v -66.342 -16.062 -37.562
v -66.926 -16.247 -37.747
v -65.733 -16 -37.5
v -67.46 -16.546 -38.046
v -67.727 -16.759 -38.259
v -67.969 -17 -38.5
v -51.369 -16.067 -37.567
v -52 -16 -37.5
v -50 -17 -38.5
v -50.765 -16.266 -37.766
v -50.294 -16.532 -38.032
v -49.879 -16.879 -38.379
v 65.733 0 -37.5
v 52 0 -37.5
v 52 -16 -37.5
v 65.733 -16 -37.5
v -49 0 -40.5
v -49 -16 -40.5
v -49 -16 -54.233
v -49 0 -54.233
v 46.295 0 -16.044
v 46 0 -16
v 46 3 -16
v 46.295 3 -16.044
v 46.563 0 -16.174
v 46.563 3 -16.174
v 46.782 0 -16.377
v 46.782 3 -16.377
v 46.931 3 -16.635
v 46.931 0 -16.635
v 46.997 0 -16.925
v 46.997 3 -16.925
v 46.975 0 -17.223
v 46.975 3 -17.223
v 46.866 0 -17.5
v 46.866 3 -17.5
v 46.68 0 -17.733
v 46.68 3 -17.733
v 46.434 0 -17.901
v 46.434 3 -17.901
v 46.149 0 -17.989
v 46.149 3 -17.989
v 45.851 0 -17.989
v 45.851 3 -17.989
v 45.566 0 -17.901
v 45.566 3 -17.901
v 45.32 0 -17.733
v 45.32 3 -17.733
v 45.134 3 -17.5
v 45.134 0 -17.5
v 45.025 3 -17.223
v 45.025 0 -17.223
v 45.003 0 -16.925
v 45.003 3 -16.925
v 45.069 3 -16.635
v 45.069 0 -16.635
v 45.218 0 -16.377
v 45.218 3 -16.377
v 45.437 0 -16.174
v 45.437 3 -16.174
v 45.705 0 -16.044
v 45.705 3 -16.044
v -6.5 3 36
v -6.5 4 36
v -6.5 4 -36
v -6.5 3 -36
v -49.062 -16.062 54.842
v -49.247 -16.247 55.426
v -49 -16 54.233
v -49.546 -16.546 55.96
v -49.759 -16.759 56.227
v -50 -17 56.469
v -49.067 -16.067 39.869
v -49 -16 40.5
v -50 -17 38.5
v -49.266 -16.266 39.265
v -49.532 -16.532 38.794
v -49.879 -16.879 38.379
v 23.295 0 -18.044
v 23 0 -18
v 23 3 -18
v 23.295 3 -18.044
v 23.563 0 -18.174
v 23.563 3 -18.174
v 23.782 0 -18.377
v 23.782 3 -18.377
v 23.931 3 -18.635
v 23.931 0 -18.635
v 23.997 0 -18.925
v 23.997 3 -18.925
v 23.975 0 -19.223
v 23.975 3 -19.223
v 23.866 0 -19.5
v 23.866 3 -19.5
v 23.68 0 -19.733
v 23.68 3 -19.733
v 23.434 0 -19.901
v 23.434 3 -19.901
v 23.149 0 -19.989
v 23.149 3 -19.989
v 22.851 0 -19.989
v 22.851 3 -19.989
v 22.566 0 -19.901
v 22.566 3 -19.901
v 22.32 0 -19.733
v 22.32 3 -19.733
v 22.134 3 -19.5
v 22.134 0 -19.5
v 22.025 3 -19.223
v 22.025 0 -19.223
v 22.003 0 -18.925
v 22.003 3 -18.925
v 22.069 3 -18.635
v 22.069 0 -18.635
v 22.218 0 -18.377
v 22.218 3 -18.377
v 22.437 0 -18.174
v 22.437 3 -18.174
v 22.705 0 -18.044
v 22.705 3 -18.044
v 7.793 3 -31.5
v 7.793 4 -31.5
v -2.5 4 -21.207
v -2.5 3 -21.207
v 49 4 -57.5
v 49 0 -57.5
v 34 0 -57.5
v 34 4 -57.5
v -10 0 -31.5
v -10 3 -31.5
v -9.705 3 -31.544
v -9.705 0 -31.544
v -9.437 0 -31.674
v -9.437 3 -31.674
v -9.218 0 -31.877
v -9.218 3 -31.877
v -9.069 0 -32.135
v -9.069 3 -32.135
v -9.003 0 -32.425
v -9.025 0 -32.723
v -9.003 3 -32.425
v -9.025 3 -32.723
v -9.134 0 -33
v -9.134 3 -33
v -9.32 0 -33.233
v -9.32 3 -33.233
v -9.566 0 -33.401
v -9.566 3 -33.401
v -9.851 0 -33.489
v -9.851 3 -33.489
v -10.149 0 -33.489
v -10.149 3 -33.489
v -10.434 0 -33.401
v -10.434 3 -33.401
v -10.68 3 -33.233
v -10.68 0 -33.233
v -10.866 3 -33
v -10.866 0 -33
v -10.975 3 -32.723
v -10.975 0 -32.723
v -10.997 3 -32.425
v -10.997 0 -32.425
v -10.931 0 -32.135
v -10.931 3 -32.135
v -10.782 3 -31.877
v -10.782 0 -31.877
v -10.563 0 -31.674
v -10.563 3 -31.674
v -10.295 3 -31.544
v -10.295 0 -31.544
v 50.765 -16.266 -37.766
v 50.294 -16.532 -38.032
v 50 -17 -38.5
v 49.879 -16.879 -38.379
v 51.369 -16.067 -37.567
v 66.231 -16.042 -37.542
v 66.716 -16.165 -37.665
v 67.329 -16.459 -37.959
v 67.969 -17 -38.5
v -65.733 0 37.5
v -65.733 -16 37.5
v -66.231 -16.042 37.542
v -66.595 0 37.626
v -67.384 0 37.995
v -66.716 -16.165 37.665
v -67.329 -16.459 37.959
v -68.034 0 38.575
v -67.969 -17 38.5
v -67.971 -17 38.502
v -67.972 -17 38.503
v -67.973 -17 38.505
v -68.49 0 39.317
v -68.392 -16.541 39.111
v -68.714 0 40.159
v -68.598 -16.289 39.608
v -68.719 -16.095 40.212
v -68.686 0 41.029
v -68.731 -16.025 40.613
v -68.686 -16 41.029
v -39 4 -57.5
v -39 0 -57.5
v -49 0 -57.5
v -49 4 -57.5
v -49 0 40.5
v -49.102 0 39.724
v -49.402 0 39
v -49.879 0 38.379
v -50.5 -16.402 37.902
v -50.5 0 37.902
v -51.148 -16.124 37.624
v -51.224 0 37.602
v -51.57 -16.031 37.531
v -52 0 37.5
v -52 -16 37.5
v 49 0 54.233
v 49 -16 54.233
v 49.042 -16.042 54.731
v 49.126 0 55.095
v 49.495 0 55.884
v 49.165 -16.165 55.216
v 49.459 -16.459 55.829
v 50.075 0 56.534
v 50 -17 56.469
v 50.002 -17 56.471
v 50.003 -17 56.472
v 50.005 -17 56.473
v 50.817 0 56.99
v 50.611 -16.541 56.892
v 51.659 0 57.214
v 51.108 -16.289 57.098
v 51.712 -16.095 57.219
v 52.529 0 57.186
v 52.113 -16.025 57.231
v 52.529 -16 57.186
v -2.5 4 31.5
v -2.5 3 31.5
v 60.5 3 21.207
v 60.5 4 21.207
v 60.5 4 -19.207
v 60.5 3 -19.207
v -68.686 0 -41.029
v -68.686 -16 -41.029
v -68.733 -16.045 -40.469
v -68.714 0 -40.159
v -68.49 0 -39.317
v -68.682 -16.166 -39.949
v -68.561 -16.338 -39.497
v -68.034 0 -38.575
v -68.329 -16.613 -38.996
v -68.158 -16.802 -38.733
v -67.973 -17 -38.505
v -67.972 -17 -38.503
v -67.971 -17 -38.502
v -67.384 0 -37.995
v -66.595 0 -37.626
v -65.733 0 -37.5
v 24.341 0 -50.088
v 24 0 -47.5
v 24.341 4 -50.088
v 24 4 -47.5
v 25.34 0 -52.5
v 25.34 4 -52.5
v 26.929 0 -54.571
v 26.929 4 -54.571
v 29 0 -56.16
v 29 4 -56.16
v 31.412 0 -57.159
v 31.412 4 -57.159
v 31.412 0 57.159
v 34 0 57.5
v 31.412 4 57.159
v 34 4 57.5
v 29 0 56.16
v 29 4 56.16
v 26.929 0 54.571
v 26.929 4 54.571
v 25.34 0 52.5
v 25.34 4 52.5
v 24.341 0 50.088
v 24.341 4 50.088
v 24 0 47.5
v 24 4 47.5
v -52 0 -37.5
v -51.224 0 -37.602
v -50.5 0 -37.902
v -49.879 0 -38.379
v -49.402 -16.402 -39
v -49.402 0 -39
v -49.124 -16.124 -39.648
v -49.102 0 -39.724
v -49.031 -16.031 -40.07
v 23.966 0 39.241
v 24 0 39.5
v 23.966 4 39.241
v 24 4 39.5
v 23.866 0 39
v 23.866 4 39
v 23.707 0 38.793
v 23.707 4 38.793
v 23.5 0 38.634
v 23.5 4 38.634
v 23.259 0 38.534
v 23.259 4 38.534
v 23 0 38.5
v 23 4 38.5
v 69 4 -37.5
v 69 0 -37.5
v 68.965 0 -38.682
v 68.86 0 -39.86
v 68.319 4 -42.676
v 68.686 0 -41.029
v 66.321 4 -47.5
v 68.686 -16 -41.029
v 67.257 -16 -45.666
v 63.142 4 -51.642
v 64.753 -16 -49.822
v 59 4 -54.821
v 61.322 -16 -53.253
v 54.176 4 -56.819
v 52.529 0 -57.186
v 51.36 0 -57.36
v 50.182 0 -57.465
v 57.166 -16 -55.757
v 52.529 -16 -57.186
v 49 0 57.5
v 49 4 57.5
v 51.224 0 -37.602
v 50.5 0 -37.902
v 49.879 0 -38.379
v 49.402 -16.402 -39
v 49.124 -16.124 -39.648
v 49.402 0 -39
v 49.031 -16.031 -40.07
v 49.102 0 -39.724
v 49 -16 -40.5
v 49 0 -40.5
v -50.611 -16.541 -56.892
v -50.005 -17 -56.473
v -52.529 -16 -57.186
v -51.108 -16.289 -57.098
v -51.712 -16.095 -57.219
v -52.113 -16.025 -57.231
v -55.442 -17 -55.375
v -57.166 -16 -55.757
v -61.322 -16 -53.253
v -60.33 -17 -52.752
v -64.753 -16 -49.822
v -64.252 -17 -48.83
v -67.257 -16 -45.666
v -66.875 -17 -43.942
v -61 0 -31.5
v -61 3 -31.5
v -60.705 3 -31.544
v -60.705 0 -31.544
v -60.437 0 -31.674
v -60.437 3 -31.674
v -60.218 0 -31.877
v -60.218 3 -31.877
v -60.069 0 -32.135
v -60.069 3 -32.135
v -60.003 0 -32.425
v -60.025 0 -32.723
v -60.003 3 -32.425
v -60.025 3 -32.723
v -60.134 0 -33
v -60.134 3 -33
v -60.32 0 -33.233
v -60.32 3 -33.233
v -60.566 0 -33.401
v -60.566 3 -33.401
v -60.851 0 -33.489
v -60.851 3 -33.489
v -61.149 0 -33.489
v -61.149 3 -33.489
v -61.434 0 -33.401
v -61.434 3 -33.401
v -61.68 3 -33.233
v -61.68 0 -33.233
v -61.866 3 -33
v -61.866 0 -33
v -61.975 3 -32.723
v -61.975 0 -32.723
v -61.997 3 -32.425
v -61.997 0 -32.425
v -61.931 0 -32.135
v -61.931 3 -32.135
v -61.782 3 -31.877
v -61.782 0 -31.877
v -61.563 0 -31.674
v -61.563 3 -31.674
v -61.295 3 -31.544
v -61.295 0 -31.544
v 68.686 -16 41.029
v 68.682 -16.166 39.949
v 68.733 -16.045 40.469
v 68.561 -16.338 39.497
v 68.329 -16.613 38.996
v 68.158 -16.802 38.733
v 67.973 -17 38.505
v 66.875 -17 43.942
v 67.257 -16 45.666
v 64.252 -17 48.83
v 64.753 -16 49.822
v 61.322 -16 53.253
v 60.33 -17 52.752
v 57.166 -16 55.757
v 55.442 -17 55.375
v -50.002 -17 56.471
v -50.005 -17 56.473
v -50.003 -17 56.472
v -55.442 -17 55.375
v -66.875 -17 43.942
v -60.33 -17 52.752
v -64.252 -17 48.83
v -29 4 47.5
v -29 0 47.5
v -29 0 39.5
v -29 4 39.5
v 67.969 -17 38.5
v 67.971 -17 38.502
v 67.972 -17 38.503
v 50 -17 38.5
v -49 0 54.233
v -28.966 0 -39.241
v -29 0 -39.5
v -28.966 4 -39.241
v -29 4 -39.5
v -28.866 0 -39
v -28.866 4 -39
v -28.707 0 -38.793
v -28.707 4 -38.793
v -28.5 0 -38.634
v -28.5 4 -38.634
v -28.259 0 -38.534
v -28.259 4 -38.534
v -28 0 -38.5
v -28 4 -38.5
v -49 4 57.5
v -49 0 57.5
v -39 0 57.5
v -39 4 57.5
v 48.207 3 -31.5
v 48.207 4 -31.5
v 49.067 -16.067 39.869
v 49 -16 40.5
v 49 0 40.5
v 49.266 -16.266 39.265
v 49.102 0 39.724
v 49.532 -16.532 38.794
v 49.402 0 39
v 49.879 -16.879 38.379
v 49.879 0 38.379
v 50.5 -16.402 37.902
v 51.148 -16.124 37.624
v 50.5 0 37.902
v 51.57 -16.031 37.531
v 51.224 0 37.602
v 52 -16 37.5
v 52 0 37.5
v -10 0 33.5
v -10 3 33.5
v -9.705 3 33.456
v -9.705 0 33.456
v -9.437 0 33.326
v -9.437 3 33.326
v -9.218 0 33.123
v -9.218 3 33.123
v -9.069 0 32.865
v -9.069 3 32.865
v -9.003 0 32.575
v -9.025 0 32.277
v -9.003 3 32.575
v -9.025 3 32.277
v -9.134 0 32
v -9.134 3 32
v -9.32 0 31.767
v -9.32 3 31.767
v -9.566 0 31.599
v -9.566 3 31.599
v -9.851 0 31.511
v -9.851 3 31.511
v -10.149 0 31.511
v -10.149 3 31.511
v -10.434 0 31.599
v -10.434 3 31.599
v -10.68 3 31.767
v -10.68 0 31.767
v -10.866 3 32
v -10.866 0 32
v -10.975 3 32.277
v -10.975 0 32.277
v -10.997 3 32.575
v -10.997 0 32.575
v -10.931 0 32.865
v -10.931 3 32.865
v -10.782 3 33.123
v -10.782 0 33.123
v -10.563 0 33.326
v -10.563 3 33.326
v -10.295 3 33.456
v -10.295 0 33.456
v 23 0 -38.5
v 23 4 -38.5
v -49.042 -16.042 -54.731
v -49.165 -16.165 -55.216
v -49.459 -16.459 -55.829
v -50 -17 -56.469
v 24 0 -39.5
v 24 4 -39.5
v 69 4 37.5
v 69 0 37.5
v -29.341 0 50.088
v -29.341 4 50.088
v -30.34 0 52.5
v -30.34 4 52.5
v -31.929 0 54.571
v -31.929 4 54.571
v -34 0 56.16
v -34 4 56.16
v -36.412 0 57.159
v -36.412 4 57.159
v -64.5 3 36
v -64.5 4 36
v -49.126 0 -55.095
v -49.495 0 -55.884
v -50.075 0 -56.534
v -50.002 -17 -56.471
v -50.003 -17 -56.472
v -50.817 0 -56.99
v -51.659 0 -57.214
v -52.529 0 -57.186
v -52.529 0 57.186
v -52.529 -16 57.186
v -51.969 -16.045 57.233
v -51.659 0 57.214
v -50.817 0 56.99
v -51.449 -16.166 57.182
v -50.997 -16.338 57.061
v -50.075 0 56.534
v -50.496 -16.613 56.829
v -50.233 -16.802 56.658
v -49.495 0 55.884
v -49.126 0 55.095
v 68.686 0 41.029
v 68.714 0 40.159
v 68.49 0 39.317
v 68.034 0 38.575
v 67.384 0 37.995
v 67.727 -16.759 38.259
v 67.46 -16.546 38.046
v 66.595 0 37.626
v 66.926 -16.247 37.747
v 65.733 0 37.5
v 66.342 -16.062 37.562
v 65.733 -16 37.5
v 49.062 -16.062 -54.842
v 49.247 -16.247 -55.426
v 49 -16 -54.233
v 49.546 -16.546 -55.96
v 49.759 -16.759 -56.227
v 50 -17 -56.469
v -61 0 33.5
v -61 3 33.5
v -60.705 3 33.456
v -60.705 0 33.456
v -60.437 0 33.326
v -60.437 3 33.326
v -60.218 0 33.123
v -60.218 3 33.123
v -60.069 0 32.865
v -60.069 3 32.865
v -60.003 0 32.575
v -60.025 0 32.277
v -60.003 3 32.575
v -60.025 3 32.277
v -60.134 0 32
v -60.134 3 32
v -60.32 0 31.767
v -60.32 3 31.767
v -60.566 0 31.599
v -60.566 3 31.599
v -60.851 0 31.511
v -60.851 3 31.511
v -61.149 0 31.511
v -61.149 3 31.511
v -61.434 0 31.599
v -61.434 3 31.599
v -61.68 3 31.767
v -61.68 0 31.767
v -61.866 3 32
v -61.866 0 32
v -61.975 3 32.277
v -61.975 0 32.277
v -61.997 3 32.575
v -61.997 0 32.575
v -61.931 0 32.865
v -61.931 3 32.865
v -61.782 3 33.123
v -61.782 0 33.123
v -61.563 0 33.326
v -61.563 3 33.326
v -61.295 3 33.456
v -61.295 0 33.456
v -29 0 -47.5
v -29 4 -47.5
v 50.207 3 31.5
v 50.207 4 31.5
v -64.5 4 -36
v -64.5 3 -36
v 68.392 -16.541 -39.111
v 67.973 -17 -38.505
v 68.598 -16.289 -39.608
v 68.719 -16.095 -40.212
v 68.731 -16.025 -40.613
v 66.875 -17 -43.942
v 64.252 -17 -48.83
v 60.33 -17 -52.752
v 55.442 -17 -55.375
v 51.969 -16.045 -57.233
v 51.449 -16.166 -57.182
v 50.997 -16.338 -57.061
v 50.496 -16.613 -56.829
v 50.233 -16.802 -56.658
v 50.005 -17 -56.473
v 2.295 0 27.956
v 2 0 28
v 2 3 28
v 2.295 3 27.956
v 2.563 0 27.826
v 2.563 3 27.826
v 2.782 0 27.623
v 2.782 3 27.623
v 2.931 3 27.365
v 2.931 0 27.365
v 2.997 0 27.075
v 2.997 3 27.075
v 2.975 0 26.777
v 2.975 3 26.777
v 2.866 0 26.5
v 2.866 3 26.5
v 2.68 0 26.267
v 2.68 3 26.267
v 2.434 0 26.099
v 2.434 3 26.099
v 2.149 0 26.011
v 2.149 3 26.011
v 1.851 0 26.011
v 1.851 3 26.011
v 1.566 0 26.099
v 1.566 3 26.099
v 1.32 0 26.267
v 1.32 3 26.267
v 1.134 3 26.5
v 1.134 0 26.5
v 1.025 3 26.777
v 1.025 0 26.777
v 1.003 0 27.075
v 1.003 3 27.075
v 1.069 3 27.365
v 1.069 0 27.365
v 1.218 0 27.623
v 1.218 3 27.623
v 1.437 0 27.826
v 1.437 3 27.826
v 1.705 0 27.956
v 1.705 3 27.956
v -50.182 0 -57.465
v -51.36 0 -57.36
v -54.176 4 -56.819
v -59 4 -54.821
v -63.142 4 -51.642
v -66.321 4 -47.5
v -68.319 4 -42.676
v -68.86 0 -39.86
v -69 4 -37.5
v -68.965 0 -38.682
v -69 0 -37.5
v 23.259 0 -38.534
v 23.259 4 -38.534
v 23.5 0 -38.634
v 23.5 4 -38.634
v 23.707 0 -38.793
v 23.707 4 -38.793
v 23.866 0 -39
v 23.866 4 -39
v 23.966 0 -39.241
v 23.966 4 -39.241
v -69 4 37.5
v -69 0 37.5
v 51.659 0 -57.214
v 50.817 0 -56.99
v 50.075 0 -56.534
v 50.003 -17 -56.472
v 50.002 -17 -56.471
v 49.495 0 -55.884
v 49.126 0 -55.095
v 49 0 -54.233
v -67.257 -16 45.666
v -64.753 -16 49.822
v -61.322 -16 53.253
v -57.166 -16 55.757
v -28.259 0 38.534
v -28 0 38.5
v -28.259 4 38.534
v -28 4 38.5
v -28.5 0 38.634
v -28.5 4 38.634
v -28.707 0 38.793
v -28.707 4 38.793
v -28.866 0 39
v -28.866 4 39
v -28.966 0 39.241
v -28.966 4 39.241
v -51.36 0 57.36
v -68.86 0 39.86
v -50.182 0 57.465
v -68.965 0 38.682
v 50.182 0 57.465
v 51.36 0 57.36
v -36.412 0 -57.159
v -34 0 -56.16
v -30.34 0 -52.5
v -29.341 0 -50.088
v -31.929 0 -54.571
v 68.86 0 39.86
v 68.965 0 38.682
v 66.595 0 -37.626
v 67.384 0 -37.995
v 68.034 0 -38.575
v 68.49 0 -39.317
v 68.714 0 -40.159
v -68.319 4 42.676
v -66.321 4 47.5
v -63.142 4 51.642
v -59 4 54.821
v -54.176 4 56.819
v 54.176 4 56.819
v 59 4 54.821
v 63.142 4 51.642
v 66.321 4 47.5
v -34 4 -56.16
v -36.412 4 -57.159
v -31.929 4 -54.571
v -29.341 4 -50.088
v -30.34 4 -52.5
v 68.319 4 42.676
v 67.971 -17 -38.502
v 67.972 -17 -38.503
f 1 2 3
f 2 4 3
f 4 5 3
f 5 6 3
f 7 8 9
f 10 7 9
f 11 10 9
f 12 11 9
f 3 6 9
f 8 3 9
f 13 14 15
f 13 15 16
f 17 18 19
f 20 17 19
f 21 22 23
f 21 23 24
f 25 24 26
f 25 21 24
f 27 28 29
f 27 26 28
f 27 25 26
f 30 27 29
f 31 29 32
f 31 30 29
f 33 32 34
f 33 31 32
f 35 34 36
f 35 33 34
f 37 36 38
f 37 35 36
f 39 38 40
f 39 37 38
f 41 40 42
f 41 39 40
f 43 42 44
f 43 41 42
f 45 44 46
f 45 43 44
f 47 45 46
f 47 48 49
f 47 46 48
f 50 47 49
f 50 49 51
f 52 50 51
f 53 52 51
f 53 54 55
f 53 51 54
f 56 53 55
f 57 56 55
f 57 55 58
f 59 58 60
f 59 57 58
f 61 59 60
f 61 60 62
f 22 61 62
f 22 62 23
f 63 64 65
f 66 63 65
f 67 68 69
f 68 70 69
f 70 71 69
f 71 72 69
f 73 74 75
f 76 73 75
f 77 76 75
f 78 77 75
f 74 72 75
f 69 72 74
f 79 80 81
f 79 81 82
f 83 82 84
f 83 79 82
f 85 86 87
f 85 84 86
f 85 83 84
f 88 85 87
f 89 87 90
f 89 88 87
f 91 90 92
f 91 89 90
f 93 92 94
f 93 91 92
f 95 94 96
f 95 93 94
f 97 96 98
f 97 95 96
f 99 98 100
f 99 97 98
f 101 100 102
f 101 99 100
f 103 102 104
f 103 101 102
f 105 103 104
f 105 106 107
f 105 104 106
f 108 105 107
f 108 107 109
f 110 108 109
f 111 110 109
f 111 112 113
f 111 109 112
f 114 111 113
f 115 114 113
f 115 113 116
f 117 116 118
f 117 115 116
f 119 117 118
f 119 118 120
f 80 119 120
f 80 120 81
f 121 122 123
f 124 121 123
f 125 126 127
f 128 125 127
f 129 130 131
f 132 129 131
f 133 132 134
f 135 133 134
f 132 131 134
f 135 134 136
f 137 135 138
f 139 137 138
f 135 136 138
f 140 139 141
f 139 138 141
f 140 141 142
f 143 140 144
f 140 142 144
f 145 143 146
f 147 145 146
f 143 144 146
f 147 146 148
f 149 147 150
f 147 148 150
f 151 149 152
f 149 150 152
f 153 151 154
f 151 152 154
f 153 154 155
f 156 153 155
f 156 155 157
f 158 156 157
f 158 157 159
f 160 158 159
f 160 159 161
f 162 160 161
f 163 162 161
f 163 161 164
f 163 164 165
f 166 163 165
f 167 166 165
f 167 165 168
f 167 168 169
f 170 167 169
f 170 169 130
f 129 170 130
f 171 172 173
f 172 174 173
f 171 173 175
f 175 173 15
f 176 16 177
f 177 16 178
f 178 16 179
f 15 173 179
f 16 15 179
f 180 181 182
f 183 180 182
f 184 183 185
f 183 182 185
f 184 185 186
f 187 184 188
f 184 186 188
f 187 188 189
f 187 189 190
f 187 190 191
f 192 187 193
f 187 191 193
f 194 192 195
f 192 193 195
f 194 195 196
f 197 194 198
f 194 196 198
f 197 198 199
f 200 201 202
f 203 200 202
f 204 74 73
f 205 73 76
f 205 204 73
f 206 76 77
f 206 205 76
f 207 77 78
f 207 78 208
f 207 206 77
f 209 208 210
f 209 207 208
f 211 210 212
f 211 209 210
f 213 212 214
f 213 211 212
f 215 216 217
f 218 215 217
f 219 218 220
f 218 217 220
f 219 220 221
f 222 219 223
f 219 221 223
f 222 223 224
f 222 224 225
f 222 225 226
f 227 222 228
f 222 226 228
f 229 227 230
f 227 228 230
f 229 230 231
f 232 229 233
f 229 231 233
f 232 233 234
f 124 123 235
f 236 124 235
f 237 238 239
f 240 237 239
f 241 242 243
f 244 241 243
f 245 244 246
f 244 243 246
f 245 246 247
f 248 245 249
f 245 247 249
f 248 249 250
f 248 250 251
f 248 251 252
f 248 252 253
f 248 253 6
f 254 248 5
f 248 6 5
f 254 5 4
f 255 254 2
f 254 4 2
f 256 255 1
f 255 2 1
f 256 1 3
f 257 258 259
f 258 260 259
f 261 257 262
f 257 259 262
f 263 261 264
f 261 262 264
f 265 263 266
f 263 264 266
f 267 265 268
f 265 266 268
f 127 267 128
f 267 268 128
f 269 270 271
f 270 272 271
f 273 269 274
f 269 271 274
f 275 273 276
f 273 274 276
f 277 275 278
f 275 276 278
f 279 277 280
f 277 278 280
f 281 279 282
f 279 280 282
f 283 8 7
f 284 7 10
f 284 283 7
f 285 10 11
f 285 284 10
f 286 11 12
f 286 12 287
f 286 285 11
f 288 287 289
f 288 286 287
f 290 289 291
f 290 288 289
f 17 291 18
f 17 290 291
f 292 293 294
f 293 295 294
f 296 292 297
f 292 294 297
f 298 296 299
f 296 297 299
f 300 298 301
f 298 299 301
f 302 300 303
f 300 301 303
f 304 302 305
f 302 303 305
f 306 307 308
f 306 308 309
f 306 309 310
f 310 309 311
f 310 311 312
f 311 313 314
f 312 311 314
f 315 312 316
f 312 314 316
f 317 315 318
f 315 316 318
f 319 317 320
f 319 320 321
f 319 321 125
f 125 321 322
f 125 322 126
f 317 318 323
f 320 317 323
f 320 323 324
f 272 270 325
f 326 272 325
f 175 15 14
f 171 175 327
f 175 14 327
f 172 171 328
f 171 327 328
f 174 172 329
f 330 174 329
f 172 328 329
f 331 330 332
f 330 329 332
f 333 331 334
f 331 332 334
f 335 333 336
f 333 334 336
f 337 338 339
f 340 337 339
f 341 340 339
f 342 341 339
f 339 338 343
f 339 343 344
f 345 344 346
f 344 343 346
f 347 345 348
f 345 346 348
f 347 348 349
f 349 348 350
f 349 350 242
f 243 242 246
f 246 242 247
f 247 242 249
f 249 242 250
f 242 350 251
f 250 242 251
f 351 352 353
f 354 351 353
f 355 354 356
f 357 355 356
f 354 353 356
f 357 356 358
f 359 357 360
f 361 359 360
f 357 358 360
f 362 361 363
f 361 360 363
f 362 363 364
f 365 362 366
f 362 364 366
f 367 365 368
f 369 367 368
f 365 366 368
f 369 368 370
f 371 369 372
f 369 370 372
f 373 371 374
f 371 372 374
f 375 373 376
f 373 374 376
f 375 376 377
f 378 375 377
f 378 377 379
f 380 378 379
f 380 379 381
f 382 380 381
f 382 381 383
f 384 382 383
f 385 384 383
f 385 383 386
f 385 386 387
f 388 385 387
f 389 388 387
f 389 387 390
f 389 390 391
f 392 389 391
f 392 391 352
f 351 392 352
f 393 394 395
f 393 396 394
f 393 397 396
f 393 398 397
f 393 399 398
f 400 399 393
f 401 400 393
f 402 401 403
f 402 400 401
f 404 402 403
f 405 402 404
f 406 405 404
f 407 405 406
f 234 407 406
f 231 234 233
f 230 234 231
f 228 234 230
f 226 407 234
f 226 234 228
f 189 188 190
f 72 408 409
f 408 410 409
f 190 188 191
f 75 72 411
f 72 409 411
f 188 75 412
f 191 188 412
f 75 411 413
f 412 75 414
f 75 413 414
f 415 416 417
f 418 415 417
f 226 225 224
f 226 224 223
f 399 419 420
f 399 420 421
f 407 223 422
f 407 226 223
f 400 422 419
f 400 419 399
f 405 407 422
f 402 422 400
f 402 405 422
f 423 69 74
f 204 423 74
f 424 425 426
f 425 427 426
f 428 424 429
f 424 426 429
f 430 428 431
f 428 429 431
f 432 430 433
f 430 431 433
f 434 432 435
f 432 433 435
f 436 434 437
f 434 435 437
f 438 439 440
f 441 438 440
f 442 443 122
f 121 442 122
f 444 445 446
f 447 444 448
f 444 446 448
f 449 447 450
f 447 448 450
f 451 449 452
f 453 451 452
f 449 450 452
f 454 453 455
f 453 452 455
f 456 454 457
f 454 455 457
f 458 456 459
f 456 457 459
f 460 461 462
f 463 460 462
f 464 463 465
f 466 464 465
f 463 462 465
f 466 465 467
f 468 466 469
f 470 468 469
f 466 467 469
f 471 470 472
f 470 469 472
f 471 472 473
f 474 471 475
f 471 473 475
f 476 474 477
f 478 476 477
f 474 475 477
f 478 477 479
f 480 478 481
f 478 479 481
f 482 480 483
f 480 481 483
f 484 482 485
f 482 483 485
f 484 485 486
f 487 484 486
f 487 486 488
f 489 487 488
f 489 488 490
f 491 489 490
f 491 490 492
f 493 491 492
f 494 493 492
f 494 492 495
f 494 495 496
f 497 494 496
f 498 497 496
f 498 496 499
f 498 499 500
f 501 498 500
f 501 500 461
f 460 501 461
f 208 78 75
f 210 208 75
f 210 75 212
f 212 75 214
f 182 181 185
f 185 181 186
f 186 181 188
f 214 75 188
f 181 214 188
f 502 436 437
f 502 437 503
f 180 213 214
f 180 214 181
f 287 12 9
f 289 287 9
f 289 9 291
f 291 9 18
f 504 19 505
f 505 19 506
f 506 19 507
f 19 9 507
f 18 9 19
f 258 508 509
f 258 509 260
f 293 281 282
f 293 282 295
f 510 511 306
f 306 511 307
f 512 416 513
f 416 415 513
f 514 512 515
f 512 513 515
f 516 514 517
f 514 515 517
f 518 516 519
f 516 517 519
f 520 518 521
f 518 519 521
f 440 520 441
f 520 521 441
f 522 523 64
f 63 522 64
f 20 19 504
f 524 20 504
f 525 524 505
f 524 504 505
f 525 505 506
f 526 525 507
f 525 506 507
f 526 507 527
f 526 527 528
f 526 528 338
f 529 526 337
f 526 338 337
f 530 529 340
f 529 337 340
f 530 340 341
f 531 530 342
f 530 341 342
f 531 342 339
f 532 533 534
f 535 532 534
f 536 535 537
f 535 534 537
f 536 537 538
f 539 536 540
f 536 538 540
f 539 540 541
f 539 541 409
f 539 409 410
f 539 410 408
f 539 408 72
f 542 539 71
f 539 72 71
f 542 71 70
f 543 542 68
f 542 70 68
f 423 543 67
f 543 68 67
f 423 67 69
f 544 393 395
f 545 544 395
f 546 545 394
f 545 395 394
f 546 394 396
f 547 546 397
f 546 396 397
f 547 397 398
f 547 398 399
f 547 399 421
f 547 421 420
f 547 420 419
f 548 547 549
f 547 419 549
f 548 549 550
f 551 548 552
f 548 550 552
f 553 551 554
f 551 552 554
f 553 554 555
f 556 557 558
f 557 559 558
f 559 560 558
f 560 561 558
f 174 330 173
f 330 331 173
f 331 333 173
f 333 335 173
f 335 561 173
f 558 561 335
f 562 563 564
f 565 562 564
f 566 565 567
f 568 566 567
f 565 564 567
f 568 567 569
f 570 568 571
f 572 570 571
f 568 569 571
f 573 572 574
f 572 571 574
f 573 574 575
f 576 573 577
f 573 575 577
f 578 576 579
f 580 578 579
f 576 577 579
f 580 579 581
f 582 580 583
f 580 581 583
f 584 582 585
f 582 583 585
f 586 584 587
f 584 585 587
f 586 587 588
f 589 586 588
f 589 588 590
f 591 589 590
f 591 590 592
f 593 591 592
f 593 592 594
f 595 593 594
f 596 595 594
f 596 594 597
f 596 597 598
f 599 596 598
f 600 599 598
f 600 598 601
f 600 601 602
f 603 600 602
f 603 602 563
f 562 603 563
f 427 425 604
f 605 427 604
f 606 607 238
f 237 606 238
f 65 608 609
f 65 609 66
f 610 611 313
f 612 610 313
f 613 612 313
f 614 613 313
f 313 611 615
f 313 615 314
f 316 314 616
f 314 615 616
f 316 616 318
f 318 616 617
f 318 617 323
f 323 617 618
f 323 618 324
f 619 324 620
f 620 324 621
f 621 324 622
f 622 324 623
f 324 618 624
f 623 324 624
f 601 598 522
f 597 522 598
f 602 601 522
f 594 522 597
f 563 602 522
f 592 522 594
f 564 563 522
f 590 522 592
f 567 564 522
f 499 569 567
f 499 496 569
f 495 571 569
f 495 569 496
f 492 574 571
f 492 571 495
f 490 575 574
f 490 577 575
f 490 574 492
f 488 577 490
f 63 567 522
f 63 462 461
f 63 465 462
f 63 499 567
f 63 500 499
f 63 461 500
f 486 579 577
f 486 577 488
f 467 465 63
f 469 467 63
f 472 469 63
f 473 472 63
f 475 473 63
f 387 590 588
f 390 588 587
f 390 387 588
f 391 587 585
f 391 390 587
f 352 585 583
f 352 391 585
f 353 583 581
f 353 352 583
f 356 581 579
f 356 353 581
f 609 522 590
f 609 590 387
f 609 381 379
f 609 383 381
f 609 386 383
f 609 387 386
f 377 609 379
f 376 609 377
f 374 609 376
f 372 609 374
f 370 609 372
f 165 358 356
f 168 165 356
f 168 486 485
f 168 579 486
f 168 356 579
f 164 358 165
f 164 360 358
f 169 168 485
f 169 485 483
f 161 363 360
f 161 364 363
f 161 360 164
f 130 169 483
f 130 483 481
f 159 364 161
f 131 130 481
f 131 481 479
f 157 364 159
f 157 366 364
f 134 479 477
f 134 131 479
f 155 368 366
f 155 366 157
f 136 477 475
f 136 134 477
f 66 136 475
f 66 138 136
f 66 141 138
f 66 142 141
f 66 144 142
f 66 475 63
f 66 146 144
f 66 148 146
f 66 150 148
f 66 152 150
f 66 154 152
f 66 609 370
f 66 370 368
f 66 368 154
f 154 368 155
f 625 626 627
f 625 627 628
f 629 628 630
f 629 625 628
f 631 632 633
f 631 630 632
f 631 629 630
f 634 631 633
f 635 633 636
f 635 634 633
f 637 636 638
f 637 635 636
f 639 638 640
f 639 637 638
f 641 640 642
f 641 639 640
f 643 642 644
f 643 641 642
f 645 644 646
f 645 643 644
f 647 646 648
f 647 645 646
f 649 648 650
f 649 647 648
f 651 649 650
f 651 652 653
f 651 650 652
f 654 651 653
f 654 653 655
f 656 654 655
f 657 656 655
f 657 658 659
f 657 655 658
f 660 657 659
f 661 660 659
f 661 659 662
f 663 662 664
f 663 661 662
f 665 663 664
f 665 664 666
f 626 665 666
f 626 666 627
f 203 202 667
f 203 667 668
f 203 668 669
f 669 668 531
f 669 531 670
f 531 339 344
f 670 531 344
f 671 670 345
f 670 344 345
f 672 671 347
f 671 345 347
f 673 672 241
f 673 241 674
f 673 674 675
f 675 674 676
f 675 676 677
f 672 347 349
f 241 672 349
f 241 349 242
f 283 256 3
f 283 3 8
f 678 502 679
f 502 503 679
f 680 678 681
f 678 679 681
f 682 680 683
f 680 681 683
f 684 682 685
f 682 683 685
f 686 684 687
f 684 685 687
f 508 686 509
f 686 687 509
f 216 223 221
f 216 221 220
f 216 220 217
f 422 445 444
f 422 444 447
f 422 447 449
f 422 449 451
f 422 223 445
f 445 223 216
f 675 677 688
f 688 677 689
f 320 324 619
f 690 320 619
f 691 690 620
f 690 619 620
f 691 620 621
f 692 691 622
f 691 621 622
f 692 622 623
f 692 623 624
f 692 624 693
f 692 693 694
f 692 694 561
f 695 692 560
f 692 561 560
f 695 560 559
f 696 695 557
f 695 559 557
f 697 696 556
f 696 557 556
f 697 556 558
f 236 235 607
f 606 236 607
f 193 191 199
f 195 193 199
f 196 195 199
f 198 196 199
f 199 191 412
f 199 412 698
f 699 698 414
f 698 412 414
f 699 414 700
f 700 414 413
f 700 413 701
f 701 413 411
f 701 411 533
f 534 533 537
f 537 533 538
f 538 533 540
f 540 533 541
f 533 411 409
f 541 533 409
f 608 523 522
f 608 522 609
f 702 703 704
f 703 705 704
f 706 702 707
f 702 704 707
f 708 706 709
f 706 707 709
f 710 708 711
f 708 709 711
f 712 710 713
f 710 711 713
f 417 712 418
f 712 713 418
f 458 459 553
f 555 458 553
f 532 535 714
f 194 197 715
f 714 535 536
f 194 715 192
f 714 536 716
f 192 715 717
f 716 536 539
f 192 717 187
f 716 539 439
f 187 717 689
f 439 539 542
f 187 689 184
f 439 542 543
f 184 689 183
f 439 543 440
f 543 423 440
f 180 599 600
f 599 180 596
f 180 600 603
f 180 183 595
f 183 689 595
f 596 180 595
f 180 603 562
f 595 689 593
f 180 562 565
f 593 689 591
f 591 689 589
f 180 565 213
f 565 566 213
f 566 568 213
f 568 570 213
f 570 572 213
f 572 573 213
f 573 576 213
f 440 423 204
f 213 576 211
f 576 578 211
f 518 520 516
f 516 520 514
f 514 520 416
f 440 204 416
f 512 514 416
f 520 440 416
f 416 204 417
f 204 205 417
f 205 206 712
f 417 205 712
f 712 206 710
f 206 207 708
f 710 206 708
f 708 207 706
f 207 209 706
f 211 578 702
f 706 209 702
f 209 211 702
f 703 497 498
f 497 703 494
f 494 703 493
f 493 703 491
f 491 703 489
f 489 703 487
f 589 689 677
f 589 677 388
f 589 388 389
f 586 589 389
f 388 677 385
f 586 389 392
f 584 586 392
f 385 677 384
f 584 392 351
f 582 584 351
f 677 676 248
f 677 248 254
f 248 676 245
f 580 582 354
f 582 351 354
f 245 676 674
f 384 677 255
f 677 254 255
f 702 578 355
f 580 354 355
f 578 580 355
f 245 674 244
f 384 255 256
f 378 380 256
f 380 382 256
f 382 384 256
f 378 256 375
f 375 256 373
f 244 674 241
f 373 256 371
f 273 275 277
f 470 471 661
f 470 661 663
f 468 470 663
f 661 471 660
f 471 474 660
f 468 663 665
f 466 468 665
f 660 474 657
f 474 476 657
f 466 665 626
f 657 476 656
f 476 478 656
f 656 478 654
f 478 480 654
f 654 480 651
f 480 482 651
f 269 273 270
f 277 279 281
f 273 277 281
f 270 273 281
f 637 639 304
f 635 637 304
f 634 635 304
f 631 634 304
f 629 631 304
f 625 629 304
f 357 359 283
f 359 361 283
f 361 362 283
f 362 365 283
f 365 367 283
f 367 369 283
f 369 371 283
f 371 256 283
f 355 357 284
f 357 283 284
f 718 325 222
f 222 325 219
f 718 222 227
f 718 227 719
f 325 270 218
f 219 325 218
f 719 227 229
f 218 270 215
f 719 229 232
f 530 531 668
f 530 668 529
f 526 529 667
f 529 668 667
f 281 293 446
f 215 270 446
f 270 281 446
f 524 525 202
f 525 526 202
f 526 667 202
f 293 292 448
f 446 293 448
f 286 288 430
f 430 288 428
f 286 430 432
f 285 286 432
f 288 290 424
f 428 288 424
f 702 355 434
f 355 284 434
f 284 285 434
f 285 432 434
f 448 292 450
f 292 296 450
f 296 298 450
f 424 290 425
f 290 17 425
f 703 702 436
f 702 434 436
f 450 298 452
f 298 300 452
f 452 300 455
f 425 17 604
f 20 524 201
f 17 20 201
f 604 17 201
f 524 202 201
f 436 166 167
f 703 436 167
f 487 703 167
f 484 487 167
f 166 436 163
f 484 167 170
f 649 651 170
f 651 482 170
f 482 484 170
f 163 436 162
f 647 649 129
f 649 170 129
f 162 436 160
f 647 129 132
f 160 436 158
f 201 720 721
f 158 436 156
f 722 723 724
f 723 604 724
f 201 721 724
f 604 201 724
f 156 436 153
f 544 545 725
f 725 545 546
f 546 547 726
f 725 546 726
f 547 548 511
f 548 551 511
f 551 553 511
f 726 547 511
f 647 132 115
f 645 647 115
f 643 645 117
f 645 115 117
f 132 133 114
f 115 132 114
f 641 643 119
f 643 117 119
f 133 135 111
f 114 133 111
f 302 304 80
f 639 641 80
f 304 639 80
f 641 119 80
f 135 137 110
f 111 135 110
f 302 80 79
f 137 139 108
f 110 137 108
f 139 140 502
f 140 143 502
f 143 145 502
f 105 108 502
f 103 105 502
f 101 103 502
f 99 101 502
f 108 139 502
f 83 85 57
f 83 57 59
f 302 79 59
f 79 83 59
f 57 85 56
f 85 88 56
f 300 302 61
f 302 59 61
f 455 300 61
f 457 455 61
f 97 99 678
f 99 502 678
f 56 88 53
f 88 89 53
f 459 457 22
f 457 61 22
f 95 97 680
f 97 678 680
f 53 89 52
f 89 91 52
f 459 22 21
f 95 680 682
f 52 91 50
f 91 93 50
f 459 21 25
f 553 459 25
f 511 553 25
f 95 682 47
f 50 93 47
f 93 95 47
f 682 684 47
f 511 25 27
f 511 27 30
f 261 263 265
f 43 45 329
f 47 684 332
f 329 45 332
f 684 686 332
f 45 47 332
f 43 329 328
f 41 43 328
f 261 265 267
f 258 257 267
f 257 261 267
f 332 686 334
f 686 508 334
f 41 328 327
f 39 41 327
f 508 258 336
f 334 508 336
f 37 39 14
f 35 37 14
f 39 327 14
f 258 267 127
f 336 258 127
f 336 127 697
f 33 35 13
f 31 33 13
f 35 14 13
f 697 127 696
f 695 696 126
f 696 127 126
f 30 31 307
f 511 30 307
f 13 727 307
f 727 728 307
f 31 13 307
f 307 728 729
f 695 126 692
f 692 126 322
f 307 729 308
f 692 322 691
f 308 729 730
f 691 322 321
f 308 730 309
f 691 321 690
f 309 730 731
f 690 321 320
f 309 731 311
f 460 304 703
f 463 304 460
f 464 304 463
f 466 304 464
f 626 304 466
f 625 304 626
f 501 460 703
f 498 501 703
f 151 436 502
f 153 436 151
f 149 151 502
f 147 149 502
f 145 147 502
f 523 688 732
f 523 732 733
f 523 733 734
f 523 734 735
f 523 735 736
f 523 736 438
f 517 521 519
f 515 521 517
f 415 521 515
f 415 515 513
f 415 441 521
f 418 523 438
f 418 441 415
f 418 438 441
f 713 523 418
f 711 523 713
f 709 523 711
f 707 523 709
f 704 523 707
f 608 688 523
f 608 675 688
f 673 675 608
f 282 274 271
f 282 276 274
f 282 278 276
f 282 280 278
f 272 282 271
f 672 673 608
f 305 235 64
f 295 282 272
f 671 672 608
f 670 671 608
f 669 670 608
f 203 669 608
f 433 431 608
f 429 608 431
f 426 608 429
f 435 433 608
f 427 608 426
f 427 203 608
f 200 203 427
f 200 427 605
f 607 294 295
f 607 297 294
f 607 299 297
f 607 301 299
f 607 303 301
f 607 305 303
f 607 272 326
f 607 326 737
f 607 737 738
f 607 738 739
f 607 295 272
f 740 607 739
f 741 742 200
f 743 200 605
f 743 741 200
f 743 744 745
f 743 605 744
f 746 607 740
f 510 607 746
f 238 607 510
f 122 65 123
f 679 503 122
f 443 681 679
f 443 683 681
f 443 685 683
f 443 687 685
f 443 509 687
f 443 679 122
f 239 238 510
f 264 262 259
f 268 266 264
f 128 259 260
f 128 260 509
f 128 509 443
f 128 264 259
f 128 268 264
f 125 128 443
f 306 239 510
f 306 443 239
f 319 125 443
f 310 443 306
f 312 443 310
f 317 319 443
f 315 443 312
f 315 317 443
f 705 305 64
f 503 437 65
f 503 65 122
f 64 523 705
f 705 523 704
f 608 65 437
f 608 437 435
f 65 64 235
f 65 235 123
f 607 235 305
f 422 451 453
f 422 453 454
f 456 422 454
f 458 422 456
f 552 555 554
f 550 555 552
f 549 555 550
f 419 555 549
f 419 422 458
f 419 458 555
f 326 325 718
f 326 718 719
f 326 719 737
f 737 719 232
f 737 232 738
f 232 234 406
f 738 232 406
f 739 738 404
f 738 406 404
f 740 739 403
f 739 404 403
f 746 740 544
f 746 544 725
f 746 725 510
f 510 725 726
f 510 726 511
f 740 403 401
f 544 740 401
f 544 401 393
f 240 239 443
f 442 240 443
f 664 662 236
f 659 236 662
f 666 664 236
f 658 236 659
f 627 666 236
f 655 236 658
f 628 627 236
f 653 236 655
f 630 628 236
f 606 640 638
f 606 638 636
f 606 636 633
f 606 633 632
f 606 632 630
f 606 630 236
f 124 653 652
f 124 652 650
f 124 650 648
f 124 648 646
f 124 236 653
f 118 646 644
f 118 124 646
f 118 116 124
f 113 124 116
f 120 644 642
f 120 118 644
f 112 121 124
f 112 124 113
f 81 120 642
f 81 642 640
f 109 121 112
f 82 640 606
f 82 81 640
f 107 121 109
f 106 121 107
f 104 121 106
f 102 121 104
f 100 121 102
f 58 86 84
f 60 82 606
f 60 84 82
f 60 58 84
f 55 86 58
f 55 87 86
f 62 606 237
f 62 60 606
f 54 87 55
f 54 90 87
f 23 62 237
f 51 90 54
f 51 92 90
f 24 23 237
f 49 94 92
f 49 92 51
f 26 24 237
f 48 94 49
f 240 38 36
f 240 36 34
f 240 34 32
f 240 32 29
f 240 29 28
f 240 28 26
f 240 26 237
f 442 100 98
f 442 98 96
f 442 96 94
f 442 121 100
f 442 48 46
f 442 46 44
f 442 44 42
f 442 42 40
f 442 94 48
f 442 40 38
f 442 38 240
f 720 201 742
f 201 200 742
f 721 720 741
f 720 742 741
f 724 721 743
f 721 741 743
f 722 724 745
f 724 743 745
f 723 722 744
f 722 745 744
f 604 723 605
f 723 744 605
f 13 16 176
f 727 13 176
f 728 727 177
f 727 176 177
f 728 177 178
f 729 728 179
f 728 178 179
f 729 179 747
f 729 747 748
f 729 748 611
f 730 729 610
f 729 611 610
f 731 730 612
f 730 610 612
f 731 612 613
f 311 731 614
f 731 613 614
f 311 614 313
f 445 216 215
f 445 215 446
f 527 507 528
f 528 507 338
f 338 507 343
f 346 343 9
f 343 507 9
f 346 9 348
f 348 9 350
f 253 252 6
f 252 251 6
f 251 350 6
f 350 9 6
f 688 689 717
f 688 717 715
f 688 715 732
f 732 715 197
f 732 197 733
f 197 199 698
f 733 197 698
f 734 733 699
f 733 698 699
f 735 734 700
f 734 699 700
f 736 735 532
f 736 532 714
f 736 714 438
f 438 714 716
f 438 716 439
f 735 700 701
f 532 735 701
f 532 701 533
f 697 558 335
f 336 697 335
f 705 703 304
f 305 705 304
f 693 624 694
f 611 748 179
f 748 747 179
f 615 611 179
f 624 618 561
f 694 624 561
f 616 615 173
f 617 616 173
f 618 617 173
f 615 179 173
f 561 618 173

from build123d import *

# Parameters (mm, degrees)
TABLE_DEPTH                  = 4
PIEDS_START                  = 17
PIEDS_DEPTH                  = 17
ENL_V_MAT_EXTRU_3_DEPTH      = 93.240175629
ENL_V_MAT_EXTRU_3_DEPTH_BACK = 93.240175629
ESQUISSE5_W                  = 5
ESQUISSE5_H                  = 18
ENL_V_MAT_EXTRU_4_DEPTH      = 93.240175629
ENL_V_MAT_EXTRU_4_DEPTH_BACK = 93.240175629
ESQUISSE6_W                  = 43
ESQUISSE6_H                  = 18
CONG_1_R                     = 10
CHANFREIN1_SIZE              = 1
CONG_2_R                     = 3
ESQUISSE3_R                  = 1
ENL_V_MAT_EXTRU_5_DEPTH      = 18
ENL_V_MAT_EXTRU_6_DEPTH      = 93.240175629
ENL_V_MAT_EXTRU_6_DEPTH_BACK = 93.240175629
ESQUISSE4_R                  = 1
ESQUISSE8_W                  = 58
ESQUISSE8_H                  = 72
ENL_V_MAT_EXTRU_7_DEPTH      = 1
ENL_V_MAT_EXTRU_8_DEPTH      = 1
ENL_V_MAT_EXTRU_9_DEPTH      = 93.240175629
ENL_V_MAT_EXTRU_9_DEPTH_BACK = 93.240175629
ESQUISSE11_W                 = 53
ESQUISSE11_H                 = 1
CONG_3_R                     = 1
CONG_4_R                     = 3


with BuildPart() as part:
    # Esquisse1 → table (new body)
    with BuildSketch(Plane(origin=(0, 0, 0), x_dir=(1, 0, 0), z_dir=(0, 1, 0))):
        with BuildLine():
            Line((-49, -57.5), (49, -57.5))
            ThreePointArc((49, -57.5), (63.142135624, -51.642135624), (69, -37.5))
            Line((69, -37.5), (69, 37.5))
            ThreePointArc((69, 37.5), (63.142135624, 51.642135624), (49, 57.5))
            Line((49, 57.5), (-49, 57.5))
            ThreePointArc((-49, 57.5), (-63.142135624, 51.642135624), (-69, 37.5))
            Line((-69, 37.5), (-69, -37.5))
            ThreePointArc((-69, -37.5), (-63.142135624, -51.642135624), (-49, -57.5))
        make_face()
    extrude(amount=TABLE_DEPTH)

    # Esquisse2 → pieds (add)
    with BuildSketch(Plane.XZ.offset(PIEDS_START)):
        with BuildLine():
            Line((-49, 57.5), (-49, 37.5))
            Line((-49, 37.5), (-69, 37.5))
            ThreePointArc((-69, 37.5), (-63.142135624, 51.642135624), (-49, 57.5))
        make_face()
        with BuildLine():
            Line((-69, -37.5), (-49, -37.5))
            Line((-49, -37.5), (-49, -57.5))
            ThreePointArc((-49, -57.5), (-63.142135624, -51.642135624), (-69, -37.5))
        make_face()
        with BuildLine():
            Line((49, -57.5), (49, -37.5))
            Line((49, -37.5), (69, -37.5))
            ThreePointArc((69, -37.5), (63.142135624, -51.642135624), (49, -57.5))
        make_face()
        with BuildLine():
            Line((49, 57.5), (49, 37.5))
            Line((49, 37.5), (69, 37.5))
            ThreePointArc((69, 37.5), (63.142135624, 51.642135624), (49, 57.5))
        make_face()
    extrude(amount=-PIEDS_DEPTH)

    # Esquisse5 → Enlèv. mat.-Extru.3 (cut, two sides: drawn at the far end of the back side and taken through both)
    with BuildSketch(Plane(origin=(0, 4, 0), x_dir=(1, 0, 0), z_dir=(0, 1, 0)).offset(-ENL_V_MAT_EXTRU_3_DEPTH_BACK)):
        with Locations((-26.5, 48.5)):
            Rectangle(ESQUISSE5_W, ESQUISSE5_H)
        with Locations((21.5, 48.5)):
            Rectangle(ESQUISSE5_W, ESQUISSE5_H)
        with Locations((-26.5, -48.5)):
            Rectangle(ESQUISSE5_W, ESQUISSE5_H)
        with Locations((21.5, -48.5)):
            Rectangle(ESQUISSE5_W, ESQUISSE5_H)
    extrude(amount=ENL_V_MAT_EXTRU_3_DEPTH + ENL_V_MAT_EXTRU_3_DEPTH_BACK, mode=Mode.SUBTRACT)

    # Esquisse6 → Enlèv. mat.-Extru.4 (cut, two sides: drawn at the far end of the back side and taken through both)
    with BuildSketch(Plane(origin=(0, 4, 0), x_dir=(1, 0, 0), z_dir=(0, 1, 0)).offset(-ENL_V_MAT_EXTRU_4_DEPTH_BACK)):
        with Locations((-2.5, 48.5)):
            Rectangle(ESQUISSE6_W, ESQUISSE6_H)
        with Locations((-2.5, -48.5)):
            Rectangle(ESQUISSE6_W, ESQUISSE6_H)
    extrude(amount=ENL_V_MAT_EXTRU_4_DEPTH + ENL_V_MAT_EXTRU_4_DEPTH_BACK, mode=Mode.SUBTRACT)

    # Congé1
    cong_1_edges = [part.edges().sort_by_distance(p)[0] for p in [
        (24, 2, 57.5),
        (-29, 2, -57.5),
        (24, 2, -57.5),
        (-29, 2, 57.5),
    ]]
    fillet(cong_1_edges, radius=CONG_1_R)

    # Chanfrein1
    chanfrein1_edges = [part.edges().sort_by_distance(p)[0] for p in [
        (59, -17, -37.5),
        (49, -17, -47.5),
        (63.142135624, -17, -51.642135624),
        (-49, -17, -47.5),
        (-59, -17, -37.5),
        (-63.142135624, -17, -51.642135624),
        (-59, -17, 37.5),
        (-49, -17, 47.5),
        (-63.142135624, -17, 51.642135624),
        (59, -17, 37.5),
        (63.142135624, -17, 51.642135624),
        (49, -17, 47.5),
    ]]
    chamfer(chanfrein1_edges, length=CHANFREIN1_SIZE)

    # Congé2
    cong_2_edges = [part.edges().sort_by_distance(p)[0] for p in [
        (49, -8, 37.5),
        (49, -8, -37.5),
        (-49, -8, -37.5),
        (-49, -8, 37.5),
    ]]
    fillet(cong_2_edges, radius=CONG_2_R)

    # Esquisse3 → Enlèv. mat.-Extru.5 (cut)
    with BuildSketch(Plane(origin=(0, 4, 0), x_dir=(1, 0, 0), z_dir=(0, 1, 0))):
        with Locations(Location((-10, -32.5, 0), (0, 0, 270))):
            Circle(ESQUISSE3_R)
        with Locations(Location((-61, -32.5, 0), (0, 0, 270))):
            Circle(ESQUISSE3_R)
        with Locations(Location((-61, 32.5, 0), (0, 0, 270))):
            Circle(ESQUISSE3_R)
        with Locations(Location((-10, 32.5, 0), (0, 0, 270))):
            Circle(ESQUISSE3_R)
    extrude(amount=-ENL_V_MAT_EXTRU_5_DEPTH, mode=Mode.SUBTRACT)

    # Esquisse4 → Enlèv. mat.-Extru.6 (cut, two sides: drawn at the far end of the back side and taken through both)
    with BuildSketch(Plane(origin=(0, 4, 0), x_dir=(1, 0, 0), z_dir=(0, 1, 0)).offset(-ENL_V_MAT_EXTRU_6_DEPTH_BACK)):
        with Locations(Location((2, -27, 0), (0, 0, 270))):
            Circle(ESQUISSE4_R)
        with Locations(Location((46, 17, 0), (0, 0, 270))):
            Circle(ESQUISSE4_R)
        with Locations(Location((23, 19, 0), (0, 0, 270))):
            Circle(ESQUISSE4_R)
    extrude(amount=ENL_V_MAT_EXTRU_6_DEPTH + ENL_V_MAT_EXTRU_6_DEPTH_BACK, mode=Mode.SUBTRACT)

    # Esquisse8 → Enlèv. mat.-Extru.7 (cut)
    with BuildSketch(Plane(origin=(0, 4, 0), x_dir=(1, 0, 0), z_dir=(0, 1, 0))):
        with Locations((-35.5, 0)):
            Rectangle(ESQUISSE8_W, ESQUISSE8_H)
    extrude(amount=-ENL_V_MAT_EXTRU_7_DEPTH, mode=Mode.SUBTRACT)

    # Esquisse10 → Enlèv. mat.-Extru.8 (cut)
    with BuildSketch(Plane(origin=(0, 4, 0), x_dir=(1, 0, 0), z_dir=(0, 1, 0))):
        Polygon((-2.5, -31.5), (50.207106781, -31.5), (60.5, -21.207106781), (60.5, 19.207106781), (48.207106781, 31.5), (7.792893219, 31.5), (-2.5, 21.207106781), align=None)
    extrude(amount=-ENL_V_MAT_EXTRU_8_DEPTH, mode=Mode.SUBTRACT)

    # Esquisse11 → Enlèv. mat.-Extru.9 (cut, two sides: drawn at the far end of the back side and taken through both)
    with BuildSketch(Plane(origin=(0, 4, 0), x_dir=(1, 0, 0), z_dir=(0, 1, 0)).offset(-ENL_V_MAT_EXTRU_9_DEPTH_BACK)):
        with Locations((-2.5, 39)):
            Rectangle(ESQUISSE11_W, ESQUISSE11_H)
        with Locations((-2.5, -39)):
            Rectangle(ESQUISSE11_W, ESQUISSE11_H)
    extrude(amount=ENL_V_MAT_EXTRU_9_DEPTH + ENL_V_MAT_EXTRU_9_DEPTH_BACK, mode=Mode.SUBTRACT)

    # Congé3
    cong_3_edges = [part.edges().sort_by_distance(p)[0] for p in [
        (24, 2, -38.5),
        (-29, 2, -38.5),
        (-29, 2, 38.5),
        (24, 2, 38.5),
    ]]
    fillet(cong_3_edges, radius=CONG_3_R)

    # Congé4
    # the kernel refuses this fillet: 3 mm, written as the material it takes off along each edge
    with BuildSketch(Plane(origin=(69, -24.858353806, 37.5), x_dir=(-1, 0, 0), z_dir=(0, 1, 0)), Plane(origin=(-69, -24.858353806, -37.5), x_dir=(1, 0, 0), z_dir=(0, 1, 0)), Plane(origin=(49, -24.858353806, -57.5), x_dir=(0, 0, 1), z_dir=(0, 1, 0)), Plane(origin=(-49, -24.858353806, 57.5), x_dir=(0, 0, -1), z_dir=(0, 1, 0))) as cong_4_piece_1:
        with BuildLine():
            CenterArc((3.266799469, 3), CONG_4_R, 169.835751378, 100.164248622)
            ThreePointArc((0.313881729, 3.529411765), (0.078624979, 1.771670761), (0, 0))
            Line((0, 0), (3.266799469, 0))
        make_face()
    extrude(amount=24.858353806, mode=Mode.SUBTRACT)
    with BuildSketch(Plane(origin=(-49, -24.858353806, -57.5), x_dir=(0, 0, 1), z_dir=(0, 1, 0)), Plane(origin=(-69, -24.858353806, 37.5), x_dir=(1, 0, 0), z_dir=(0, 1, 0)), Plane(origin=(69, -24.858353806, -37.5), x_dir=(-1, 0, 0), z_dir=(0, 1, 0)), Plane(origin=(49, -24.858353806, 57.5), x_dir=(0, 0, -1), z_dir=(0, 1, 0))) as cong_4_piece_2:
        with BuildLine():
            CenterArc((3.266799469, -3), CONG_4_R, 90, 100.164248622)
            ThreePointArc((0.313881729, -3.529411765), (0.078624979, -1.771670761), (0, 0))
            Line((0, 0), (3.266799469, 0))
        make_face()
    extrude(amount=24.858353806, mode=Mode.SUBTRACT)


solid = part.part
